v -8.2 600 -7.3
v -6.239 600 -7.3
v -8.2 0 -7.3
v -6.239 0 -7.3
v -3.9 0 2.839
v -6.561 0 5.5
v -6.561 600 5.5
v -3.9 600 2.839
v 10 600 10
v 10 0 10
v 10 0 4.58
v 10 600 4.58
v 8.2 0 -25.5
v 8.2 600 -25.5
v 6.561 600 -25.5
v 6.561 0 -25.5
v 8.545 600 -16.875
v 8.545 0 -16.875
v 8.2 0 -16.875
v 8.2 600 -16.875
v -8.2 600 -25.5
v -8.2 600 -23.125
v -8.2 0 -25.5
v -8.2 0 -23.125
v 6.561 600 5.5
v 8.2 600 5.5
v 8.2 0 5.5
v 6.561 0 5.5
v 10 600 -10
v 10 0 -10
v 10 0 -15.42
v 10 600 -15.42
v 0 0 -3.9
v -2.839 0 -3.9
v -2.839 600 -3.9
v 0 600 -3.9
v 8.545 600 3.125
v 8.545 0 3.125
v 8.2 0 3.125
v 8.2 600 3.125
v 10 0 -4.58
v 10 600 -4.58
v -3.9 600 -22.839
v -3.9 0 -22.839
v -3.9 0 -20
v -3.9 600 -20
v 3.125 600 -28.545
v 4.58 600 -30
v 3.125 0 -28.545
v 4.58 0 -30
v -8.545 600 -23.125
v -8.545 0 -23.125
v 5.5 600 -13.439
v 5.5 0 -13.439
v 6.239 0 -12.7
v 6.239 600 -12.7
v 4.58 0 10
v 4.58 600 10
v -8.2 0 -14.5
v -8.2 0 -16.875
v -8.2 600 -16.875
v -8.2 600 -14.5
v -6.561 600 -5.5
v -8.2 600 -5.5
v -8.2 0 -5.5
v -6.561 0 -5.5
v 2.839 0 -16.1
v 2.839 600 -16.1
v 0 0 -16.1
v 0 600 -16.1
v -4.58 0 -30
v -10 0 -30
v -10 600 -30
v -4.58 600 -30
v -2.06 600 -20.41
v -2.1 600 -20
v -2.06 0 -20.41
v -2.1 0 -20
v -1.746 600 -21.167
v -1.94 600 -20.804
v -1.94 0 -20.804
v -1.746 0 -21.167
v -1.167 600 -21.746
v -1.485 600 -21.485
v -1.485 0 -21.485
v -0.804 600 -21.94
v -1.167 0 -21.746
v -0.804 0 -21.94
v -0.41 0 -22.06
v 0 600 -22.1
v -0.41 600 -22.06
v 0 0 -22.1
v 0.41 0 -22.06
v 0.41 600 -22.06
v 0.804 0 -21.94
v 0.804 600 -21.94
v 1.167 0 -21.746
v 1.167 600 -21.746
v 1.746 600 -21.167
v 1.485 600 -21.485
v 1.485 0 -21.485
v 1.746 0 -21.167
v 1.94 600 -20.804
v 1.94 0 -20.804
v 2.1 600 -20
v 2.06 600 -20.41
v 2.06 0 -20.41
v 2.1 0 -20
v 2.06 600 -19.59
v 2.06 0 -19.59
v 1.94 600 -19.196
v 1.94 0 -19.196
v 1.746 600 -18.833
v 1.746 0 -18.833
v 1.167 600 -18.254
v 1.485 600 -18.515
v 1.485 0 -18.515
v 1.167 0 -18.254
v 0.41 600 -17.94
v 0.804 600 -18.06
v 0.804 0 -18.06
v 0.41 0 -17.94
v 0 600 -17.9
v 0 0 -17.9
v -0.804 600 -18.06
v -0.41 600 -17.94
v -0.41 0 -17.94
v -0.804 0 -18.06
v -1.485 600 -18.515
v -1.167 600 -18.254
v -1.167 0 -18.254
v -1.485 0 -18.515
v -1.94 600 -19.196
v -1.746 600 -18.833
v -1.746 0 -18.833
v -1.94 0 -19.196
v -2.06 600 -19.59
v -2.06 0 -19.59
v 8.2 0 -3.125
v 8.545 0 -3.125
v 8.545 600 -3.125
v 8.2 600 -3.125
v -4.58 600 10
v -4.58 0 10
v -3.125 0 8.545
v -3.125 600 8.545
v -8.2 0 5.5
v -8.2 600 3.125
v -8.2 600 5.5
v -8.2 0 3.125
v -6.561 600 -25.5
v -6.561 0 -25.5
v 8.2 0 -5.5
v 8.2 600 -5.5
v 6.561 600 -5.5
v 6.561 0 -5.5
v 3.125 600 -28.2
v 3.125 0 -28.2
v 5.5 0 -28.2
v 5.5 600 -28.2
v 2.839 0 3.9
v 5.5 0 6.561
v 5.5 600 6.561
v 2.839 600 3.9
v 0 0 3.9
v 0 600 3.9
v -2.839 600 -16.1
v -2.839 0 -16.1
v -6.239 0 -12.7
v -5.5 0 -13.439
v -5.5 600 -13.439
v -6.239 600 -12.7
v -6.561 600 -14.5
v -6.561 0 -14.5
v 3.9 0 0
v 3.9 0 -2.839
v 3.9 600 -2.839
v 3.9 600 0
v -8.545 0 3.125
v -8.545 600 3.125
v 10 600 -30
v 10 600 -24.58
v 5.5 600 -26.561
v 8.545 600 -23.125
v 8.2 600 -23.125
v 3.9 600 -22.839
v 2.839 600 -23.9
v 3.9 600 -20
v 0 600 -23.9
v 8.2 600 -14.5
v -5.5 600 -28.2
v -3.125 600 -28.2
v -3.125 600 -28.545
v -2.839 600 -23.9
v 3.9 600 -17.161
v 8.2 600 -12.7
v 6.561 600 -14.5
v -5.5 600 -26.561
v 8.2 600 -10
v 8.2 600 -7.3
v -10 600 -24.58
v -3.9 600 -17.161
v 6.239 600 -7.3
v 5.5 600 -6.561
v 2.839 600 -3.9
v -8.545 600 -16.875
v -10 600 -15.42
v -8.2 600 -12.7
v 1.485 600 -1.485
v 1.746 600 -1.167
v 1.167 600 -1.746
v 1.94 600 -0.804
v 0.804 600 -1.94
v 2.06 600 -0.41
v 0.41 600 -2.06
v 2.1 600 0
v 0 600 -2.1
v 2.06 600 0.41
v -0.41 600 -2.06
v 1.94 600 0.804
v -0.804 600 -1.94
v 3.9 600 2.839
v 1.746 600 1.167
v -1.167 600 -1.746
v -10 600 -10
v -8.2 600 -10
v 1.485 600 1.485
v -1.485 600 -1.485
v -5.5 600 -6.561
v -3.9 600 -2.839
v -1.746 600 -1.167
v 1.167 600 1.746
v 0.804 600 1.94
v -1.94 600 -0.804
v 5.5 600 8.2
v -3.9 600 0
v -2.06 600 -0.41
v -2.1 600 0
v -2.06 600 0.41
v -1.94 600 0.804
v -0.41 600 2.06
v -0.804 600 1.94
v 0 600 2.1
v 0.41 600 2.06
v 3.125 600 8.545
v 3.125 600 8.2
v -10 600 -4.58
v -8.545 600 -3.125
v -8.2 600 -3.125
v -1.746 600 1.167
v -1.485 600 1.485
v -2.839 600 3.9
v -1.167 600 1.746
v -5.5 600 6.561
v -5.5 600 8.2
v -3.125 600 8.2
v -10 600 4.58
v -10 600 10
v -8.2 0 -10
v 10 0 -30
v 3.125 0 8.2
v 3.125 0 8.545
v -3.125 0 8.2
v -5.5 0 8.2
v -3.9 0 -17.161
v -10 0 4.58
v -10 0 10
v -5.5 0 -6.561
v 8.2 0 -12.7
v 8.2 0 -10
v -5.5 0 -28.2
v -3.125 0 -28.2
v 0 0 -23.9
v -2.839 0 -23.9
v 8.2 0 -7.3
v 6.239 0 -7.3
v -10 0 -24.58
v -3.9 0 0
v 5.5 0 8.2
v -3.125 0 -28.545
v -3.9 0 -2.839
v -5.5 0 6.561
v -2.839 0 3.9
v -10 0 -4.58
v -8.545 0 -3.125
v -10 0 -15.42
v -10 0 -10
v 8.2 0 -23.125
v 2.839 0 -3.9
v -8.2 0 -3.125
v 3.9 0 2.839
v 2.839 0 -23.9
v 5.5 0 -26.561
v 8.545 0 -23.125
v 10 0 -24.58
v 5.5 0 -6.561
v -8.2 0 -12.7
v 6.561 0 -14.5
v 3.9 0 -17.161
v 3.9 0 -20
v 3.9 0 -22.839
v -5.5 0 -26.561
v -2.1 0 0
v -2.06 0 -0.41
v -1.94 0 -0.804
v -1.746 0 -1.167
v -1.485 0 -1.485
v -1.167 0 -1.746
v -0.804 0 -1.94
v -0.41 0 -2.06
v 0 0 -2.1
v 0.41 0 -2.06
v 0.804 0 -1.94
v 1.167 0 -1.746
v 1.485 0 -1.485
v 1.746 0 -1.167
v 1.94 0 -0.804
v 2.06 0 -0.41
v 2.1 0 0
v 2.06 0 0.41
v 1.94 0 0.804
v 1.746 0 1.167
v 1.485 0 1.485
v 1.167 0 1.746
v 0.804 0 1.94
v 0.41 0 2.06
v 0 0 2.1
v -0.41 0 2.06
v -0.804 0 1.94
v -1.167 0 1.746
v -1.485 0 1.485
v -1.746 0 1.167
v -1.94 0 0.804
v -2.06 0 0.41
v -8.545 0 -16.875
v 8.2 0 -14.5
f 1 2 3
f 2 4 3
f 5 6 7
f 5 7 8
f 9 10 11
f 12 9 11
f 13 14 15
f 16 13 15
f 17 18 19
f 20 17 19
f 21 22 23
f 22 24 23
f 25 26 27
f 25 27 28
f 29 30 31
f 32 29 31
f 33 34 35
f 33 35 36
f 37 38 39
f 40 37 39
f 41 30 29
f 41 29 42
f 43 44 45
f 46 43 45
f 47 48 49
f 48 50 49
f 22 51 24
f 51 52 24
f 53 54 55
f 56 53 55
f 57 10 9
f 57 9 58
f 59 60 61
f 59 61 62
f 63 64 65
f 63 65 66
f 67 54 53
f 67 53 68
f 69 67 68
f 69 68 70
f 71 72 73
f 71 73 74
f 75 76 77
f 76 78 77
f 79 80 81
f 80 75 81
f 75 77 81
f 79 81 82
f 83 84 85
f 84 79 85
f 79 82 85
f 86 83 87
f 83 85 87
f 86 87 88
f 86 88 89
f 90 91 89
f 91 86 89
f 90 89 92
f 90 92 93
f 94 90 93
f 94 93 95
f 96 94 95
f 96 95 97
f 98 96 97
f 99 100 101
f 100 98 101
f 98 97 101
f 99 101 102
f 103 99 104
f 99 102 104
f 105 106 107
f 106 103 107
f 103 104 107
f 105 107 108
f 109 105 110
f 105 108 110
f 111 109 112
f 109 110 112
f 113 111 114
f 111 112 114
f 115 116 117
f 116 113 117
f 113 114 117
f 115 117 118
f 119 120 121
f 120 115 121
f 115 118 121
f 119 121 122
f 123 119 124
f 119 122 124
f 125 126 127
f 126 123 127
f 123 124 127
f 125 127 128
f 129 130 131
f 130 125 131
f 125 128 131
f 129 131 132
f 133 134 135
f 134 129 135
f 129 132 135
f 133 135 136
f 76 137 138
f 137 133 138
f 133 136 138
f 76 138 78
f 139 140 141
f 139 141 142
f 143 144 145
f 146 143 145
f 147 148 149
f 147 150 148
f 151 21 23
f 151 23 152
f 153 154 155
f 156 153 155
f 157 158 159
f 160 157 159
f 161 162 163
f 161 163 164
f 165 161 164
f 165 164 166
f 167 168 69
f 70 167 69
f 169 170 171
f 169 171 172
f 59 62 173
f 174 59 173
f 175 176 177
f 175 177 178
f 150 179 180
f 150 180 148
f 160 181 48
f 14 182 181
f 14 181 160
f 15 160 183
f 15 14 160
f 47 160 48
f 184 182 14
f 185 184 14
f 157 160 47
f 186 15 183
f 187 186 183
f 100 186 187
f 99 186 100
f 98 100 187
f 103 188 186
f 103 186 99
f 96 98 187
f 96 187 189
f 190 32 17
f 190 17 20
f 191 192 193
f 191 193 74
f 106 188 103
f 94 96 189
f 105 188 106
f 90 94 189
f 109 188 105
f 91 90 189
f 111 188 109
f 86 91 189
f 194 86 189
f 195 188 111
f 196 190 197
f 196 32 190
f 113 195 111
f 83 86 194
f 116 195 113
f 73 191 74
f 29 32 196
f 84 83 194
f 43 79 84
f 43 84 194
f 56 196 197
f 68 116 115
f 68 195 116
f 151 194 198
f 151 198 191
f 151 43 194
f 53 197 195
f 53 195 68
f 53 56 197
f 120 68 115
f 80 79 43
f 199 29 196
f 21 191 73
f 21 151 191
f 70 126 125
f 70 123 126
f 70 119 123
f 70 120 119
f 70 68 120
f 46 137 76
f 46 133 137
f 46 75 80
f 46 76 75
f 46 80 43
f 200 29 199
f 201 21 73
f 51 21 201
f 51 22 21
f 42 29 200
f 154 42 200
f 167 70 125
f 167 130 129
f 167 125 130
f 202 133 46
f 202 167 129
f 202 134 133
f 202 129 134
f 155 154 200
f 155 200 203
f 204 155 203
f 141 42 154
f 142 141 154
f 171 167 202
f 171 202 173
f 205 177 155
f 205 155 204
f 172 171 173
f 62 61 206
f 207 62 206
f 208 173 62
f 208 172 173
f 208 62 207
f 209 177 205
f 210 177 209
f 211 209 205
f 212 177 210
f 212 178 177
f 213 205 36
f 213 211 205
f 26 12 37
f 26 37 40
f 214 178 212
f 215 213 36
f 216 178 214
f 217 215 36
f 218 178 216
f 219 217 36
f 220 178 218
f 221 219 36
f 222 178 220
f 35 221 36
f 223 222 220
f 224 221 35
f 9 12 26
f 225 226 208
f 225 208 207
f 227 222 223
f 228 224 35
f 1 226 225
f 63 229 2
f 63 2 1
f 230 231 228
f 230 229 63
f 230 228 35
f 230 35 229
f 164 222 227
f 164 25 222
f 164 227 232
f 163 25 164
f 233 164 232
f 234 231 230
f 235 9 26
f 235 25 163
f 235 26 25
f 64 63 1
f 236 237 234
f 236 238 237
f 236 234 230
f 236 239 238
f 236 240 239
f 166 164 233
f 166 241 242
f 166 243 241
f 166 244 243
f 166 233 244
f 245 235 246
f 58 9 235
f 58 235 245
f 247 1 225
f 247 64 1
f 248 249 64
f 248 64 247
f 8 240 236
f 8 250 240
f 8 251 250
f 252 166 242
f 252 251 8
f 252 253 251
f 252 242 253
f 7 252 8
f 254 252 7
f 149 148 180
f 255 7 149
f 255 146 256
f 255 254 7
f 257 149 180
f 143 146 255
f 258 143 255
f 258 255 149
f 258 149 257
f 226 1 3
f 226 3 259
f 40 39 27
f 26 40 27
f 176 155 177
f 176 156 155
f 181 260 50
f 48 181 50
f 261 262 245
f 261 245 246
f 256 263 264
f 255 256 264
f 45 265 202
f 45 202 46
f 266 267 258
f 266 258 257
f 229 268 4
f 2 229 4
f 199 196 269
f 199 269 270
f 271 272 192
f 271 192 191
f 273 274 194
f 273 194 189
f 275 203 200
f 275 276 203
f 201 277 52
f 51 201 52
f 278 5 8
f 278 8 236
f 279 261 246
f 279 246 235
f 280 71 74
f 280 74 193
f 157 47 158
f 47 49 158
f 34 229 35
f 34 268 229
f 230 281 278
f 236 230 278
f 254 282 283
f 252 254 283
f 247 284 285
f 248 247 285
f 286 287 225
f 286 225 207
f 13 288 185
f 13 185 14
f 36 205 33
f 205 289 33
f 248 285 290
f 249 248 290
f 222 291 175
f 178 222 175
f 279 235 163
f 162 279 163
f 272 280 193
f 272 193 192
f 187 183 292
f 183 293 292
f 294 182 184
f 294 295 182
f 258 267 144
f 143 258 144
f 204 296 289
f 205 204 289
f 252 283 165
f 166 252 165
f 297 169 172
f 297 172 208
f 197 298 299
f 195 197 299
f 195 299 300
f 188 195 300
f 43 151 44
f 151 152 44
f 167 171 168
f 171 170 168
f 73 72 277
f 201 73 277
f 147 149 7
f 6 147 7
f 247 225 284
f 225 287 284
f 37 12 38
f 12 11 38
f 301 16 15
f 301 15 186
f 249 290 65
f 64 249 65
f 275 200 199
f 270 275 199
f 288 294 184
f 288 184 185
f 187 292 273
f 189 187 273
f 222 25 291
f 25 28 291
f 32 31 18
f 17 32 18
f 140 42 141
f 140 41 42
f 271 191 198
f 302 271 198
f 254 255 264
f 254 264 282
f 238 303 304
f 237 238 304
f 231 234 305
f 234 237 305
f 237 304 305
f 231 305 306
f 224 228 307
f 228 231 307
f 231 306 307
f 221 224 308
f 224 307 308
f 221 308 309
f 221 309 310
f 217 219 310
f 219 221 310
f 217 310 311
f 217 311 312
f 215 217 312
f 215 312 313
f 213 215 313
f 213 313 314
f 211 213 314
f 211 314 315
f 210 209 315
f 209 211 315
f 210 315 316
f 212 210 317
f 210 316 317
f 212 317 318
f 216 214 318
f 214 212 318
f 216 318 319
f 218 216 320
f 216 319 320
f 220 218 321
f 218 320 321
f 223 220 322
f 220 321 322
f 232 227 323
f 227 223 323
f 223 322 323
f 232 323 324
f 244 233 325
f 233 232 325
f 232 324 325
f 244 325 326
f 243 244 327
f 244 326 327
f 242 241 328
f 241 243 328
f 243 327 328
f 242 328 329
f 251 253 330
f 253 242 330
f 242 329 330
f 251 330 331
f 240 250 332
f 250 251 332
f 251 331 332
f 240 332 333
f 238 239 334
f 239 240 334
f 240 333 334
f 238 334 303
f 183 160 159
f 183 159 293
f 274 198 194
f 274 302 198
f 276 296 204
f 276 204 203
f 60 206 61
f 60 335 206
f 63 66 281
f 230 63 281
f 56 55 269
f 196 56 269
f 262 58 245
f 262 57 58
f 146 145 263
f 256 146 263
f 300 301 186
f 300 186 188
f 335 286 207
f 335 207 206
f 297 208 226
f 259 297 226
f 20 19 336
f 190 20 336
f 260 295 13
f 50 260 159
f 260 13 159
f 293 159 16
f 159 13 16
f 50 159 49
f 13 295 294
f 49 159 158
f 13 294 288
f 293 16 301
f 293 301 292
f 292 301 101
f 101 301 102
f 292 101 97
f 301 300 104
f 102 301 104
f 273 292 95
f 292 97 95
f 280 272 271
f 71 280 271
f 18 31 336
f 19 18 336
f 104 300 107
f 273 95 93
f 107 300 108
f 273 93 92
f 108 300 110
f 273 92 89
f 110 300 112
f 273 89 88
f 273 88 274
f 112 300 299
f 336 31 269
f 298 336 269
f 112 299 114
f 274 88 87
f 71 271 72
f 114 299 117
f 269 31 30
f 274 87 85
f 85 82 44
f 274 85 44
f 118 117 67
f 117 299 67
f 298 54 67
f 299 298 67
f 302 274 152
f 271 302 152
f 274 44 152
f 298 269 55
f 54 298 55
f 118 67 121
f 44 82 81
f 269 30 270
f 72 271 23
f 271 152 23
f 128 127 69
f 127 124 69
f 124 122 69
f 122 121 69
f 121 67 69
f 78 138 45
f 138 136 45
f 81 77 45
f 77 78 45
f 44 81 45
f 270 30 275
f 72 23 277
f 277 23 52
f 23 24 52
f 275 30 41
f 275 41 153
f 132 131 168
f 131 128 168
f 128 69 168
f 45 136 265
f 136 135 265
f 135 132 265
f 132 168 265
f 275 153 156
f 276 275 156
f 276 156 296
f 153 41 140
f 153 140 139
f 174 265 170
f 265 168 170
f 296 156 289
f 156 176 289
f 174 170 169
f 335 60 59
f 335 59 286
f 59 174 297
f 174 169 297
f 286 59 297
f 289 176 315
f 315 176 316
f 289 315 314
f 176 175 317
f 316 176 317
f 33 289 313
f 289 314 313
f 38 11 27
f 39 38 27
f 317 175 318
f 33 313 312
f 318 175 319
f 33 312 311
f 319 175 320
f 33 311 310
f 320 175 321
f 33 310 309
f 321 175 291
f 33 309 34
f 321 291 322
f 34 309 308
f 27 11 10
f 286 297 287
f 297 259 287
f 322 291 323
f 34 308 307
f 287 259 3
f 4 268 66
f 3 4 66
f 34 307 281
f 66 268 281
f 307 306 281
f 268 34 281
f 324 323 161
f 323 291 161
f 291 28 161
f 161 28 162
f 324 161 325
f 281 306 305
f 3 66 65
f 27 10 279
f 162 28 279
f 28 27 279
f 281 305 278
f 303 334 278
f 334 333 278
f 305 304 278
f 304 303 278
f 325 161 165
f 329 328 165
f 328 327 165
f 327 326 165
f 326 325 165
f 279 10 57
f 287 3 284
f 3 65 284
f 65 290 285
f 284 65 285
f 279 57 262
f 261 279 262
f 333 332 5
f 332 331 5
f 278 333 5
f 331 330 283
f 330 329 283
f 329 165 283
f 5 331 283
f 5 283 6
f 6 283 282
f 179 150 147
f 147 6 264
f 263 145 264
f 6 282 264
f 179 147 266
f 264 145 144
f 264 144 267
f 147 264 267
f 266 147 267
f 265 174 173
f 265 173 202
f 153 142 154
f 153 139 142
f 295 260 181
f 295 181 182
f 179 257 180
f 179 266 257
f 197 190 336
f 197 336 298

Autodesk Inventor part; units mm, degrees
ref_plane "YZ Plane" through (0, 0, 0) normal (1, 0, 0) x (0, 1, 0)
ref_plane "XZ Plane" through (0, 0, 0) normal (0, 1, 0) x (-1, 0, 0)
ref_plane "XY Plane" through (0, 0, 0) normal (0, 0, 1) x (1, 0, 0)
sketch "Sketch1" plane through (0, 0, 0) normal (0, 1, 0) x (-1, 0, 0)
  circle A0 centre (0, 0) radius 2.1
  line L0 (10, 10) -> (-10, 10) construction
  line L1 (-10, 10) -> (-10, -10) construction
  line L2 (-10, -10) -> (10, -10) construction
  line L3 (10, -10) -> (10, 10) construction
  line L4 (10, 10) -> (-10, -10) construction
  line L5 (-10, 10) -> (10, -10) construction
  line L6 (8.2, 10) -> (8.2, -10) construction
  line L7 (3.9, 10) -> (3.9, -10) construction
  line L8 (8.2, 3.125) -> (8.2, -3.125) construction
  line L9 (10, 4.58) -> (10, -4.58) construction
  line L10 (8.2, 5.5) -> (8.2, -5.5) construction
  line L11 (3.3697, 4.4303) -> (4.4303, 3.3697) construction
  line L12 (10, 10) -> (10, 4.58)
  line L13 (10, 4.58) -> (8.545, 3.125)
  line L14 (8.545, 3.125) -> (8.2, 3.125)
  line L15 (8.2, 3.125) -> (8.2, 5.5)
  line L16 (14, 0) -> (-14, 0) construction
  line L17 (8.2, 5.5) -> (6.5607, 5.5)
  line L18 (6.5607, 5.5) -> (3.9, 2.8393)
  line L19 (3.9, 2.8393) -> (3.9, 0)
  line L20 (10, -10) -> (10, -4.58)
  line L21 (10, -4.58) -> (8.545, -3.125)
  line L22 (8.545, -3.125) -> (8.2, -3.125)
  line L23 (8.2, -3.125) -> (8.2, -5.5)
  line L24 (8.2, -5.5) -> (6.5607, -5.5)
  line L25 (6.5607, -5.5) -> (3.9, -2.8393)
  line L26 (3.9, -2.8393) -> (3.9, 0)
  line L27 (-10, 10) -> (-4.58, 10)
  line L28 (-4.58, 10) -> (-3.125, 8.545)
  line L29 (-3.125, 8.2) -> (-5.5, 8.2)
  line L30 (-5.5, 8.2) -> (-5.5, 6.5607)
  line L31 (-5.5, 6.5607) -> (-2.8393, 3.9)
  line L32 (-2.8393, 3.9) -> (0, 3.9)
  line L33 (2.8393, 3.9) -> (0, 3.9)
  line L34 (5.5, 6.5607) -> (2.8393, 3.9)
  line L35 (5.5, 8.2) -> (5.5, 6.5607)
  line L36 (3.125, 8.2) -> (5.5, 8.2)
  line L37 (3.125, 8.545) -> (3.125, 8.2)
  line L38 (4.58, 10) -> (3.125, 8.545)
  line L39 (-3.125, 8.545) -> (-3.125, 8.2)
  line L40 (10, 10) -> (4.58, 10)
  line L41 (-10, -10) -> (-10, -4.58)
  line L42 (-10, -4.58) -> (-8.545, -3.125)
  line L43 (-8.2, -3.125) -> (-8.2, -5.5)
  line L44 (-8.2, -5.5) -> (-6.5607, -5.5)
  line L45 (-6.5607, -5.5) -> (-3.9, -2.8393)
  line L46 (-3.9, -2.8393) -> (-3.9, 0)
  line L47 (-3.9, 2.8393) -> (-3.9, 0)
  line L48 (-6.5607, 5.5) -> (-3.9, 2.8393)
  line L49 (-8.2, 5.5) -> (-6.5607, 5.5)
  line L50 (-8.2, 3.125) -> (-8.2, 5.5)
  line L51 (-8.545, 3.125) -> (-8.2, 3.125)
  line L52 (-10, 4.58) -> (-8.545, 3.125)
  line L53 (-8.545, -3.125) -> (-8.2, -3.125)
  line L54 (-10, 10) -> (-10, 4.58)
  line L55 (10, -10) -> (4.58, -10) construction
  line L56 (4.58, -10) -> (3.125, -8.545) construction
  line L57 (3.125, -8.2) -> (5.5, -8.2) construction
  line L58 (5.5, -8.2) -> (5.5, -6.5607) construction
  line L59 (5.5, -6.5607) -> (2.8393, -3.9)
  line L60 (2.8393, -3.9) -> (0, -3.9)
  line L61 (-2.8393, -3.9) -> (0, -3.9)
  line L62 (-5.5, -6.5607) -> (-2.8393, -3.9)
  line L63 (-5.5, -8.2) -> (-5.5, -6.5607) construction
  line L64 (-3.125, -8.2) -> (-5.5, -8.2) construction
  line L65 (-3.125, -8.545) -> (-3.125, -8.2) construction
  line L66 (-4.58, -10) -> (-3.125, -8.545) construction
  line L67 (3.125, -8.545) -> (3.125, -8.2) construction
  line L68 (-10, -10) -> (-4.58, -10) construction
  line L69 (5.5, -6.5607) -> (6.2393, -7.3)
  line L70 (6.2393, -7.3) -> (8.2, -7.3)
  line L71 (0, -10) -> (0, -9) construction
  line L72 (-5.5, -6.5607) -> (-6.2393, -7.3)
  line L73 (-6.2393, -7.3) -> (-8.2, -7.3)
  line L74 (8.2, -7.3) -> (8.2, -10)
  line L75 (-8.2, -7.3) -> (-8.2, -10)
  circle A1 centre (0, -20) radius 2.1
  line L76 (10, -30) -> (10, -24.58)
  line L77 (10, -24.58) -> (8.545, -23.125)
  line L78 (8.545, -23.125) -> (8.2, -23.125)
  line L79 (8.2, -23.125) -> (8.2, -25.5)
  line L80 (8.2, -25.5) -> (6.5607, -25.5)
  line L81 (6.5607, -25.5) -> (3.9, -22.8393)
  line L82 (3.9, -22.8393) -> (3.9, -20)
  line L83 (10, -10) -> (10, -15.42)
  line L84 (10, -15.42) -> (8.545, -16.875)
  line L85 (8.2, -16.875) -> (8.2, -14.5)
  line L86 (8.2, -14.5) -> (6.5607, -14.5)
  line L87 (6.5607, -14.5) -> (3.9, -17.1607)
  line L88 (3.9, -17.1607) -> (3.9, -20)
  line L89 (-10, -30) -> (-4.58, -30)
  line L90 (-4.58, -30) -> (-3.125, -28.545)
  line L91 (-3.125, -28.2) -> (-5.5, -28.2)
  line L92 (-5.5, -28.2) -> (-5.5, -26.5607)
  line L93 (-5.5, -26.5607) -> (-2.8393, -23.9)
  line L94 (-2.8393, -23.9) -> (0, -23.9)
  line L95 (2.8393, -23.9) -> (0, -23.9)
  line L96 (5.5, -26.5607) -> (2.8393, -23.9)
  line L97 (5.5, -28.2) -> (5.5, -26.5607)
  line L98 (3.125, -28.2) -> (5.5, -28.2)
  line L99 (3.125, -28.545) -> (3.125, -28.2)
  line L100 (4.58, -30) -> (3.125, -28.545)
  line L101 (-3.125, -28.545) -> (-3.125, -28.2)
  line L102 (10, -30) -> (4.58, -30)
  line L103 (-10, -10) -> (-10, -15.42)
  line L104 (-10, -15.42) -> (-8.545, -16.875)
  line L105 (-8.2, -16.875) -> (-8.2, -14.5)
  line L106 (-8.2, -14.5) -> (-6.5607, -14.5)
  line L107 (-6.5607, -14.5) -> (-3.9, -17.1607)
  line L108 (-3.9, -17.1607) -> (-3.9, -20)
  line L109 (-3.9, -22.8393) -> (-3.9, -20)
  line L110 (-6.5607, -25.5) -> (-3.9, -22.8393)
  line L111 (-8.2, -25.5) -> (-6.5607, -25.5)
  line L112 (-8.2, -23.125) -> (-8.2, -25.5)
  line L113 (-8.545, -23.125) -> (-8.2, -23.125)
  line L114 (-10, -24.58) -> (-8.545, -23.125)
  line L115 (-8.545, -16.875) -> (-8.2, -16.875)
  line L116 (-10, -30) -> (-10, -24.58)
  line L117 (5.5, -13.4393) -> (2.8393, -16.1)
  line L118 (2.8393, -16.1) -> (0, -16.1)
  line L119 (-2.8393, -16.1) -> (0, -16.1)
  line L120 (-5.5, -13.4393) -> (-2.8393, -16.1)
  line L121 (5.5, -13.4393) -> (6.2393, -12.7)
  line L122 (6.2393, -12.7) -> (8.2, -12.7)
  line L123 (-5.5, -13.4393) -> (-6.2393, -12.7)
  line L124 (-6.2393, -12.7) -> (-8.2, -12.7)
  line L125 (8.2, -12.7) -> (8.2, -10)
  line L126 (-8.2, -12.7) -> (-8.2, -10)
  line L127 (8.545, -16.875) -> (8.2, -16.875)
  point P0 (10, 0)
  point P1 (8.2, 0)
  point P2 (3.9, 3.9)
  point P3 (-3.3697, 4.4303)
  point P4 (-4.4303, -3.3697)
  point P5 (3.3697, -4.4303)
  dimension "d0" = 4.2
  dimension "d1" = 20
  dimension "d2" = 20
  dimension "d3" = 1.8
  dimension "d4" = 4.3
  dimension "d5" = 6.25
  dimension "d6" = 9.16
  dimension "d7" = 11
  dimension "d8" = 1.5
  dimension "d9" = 45
  dimension "d12" = 360
  dimension "d17" = 1.8
  dimension "d18" = 1
extrude "Extrusion1" add sketch "Sketch1" along normal blind 600
ref_plane "Work Plane1" through (-2.8393, 0, 0) normal (0, 0, -1) x (-1, 0, 0)
ref_plane "Work Plane2" through (0, 0, 4.58) normal (1, 0, 0) x (0, 0, -1)
ref_plane "Work Plane3" through (0, 300, 0) normal (0, 1, 0) x (1, 0, 0)
ref_plane "Work Plane4" through (2.8393, 0, -20) normal (0, 0, 1) x (1, 0, 0)
properties part number "VSLOT 2020 Extrusion"
